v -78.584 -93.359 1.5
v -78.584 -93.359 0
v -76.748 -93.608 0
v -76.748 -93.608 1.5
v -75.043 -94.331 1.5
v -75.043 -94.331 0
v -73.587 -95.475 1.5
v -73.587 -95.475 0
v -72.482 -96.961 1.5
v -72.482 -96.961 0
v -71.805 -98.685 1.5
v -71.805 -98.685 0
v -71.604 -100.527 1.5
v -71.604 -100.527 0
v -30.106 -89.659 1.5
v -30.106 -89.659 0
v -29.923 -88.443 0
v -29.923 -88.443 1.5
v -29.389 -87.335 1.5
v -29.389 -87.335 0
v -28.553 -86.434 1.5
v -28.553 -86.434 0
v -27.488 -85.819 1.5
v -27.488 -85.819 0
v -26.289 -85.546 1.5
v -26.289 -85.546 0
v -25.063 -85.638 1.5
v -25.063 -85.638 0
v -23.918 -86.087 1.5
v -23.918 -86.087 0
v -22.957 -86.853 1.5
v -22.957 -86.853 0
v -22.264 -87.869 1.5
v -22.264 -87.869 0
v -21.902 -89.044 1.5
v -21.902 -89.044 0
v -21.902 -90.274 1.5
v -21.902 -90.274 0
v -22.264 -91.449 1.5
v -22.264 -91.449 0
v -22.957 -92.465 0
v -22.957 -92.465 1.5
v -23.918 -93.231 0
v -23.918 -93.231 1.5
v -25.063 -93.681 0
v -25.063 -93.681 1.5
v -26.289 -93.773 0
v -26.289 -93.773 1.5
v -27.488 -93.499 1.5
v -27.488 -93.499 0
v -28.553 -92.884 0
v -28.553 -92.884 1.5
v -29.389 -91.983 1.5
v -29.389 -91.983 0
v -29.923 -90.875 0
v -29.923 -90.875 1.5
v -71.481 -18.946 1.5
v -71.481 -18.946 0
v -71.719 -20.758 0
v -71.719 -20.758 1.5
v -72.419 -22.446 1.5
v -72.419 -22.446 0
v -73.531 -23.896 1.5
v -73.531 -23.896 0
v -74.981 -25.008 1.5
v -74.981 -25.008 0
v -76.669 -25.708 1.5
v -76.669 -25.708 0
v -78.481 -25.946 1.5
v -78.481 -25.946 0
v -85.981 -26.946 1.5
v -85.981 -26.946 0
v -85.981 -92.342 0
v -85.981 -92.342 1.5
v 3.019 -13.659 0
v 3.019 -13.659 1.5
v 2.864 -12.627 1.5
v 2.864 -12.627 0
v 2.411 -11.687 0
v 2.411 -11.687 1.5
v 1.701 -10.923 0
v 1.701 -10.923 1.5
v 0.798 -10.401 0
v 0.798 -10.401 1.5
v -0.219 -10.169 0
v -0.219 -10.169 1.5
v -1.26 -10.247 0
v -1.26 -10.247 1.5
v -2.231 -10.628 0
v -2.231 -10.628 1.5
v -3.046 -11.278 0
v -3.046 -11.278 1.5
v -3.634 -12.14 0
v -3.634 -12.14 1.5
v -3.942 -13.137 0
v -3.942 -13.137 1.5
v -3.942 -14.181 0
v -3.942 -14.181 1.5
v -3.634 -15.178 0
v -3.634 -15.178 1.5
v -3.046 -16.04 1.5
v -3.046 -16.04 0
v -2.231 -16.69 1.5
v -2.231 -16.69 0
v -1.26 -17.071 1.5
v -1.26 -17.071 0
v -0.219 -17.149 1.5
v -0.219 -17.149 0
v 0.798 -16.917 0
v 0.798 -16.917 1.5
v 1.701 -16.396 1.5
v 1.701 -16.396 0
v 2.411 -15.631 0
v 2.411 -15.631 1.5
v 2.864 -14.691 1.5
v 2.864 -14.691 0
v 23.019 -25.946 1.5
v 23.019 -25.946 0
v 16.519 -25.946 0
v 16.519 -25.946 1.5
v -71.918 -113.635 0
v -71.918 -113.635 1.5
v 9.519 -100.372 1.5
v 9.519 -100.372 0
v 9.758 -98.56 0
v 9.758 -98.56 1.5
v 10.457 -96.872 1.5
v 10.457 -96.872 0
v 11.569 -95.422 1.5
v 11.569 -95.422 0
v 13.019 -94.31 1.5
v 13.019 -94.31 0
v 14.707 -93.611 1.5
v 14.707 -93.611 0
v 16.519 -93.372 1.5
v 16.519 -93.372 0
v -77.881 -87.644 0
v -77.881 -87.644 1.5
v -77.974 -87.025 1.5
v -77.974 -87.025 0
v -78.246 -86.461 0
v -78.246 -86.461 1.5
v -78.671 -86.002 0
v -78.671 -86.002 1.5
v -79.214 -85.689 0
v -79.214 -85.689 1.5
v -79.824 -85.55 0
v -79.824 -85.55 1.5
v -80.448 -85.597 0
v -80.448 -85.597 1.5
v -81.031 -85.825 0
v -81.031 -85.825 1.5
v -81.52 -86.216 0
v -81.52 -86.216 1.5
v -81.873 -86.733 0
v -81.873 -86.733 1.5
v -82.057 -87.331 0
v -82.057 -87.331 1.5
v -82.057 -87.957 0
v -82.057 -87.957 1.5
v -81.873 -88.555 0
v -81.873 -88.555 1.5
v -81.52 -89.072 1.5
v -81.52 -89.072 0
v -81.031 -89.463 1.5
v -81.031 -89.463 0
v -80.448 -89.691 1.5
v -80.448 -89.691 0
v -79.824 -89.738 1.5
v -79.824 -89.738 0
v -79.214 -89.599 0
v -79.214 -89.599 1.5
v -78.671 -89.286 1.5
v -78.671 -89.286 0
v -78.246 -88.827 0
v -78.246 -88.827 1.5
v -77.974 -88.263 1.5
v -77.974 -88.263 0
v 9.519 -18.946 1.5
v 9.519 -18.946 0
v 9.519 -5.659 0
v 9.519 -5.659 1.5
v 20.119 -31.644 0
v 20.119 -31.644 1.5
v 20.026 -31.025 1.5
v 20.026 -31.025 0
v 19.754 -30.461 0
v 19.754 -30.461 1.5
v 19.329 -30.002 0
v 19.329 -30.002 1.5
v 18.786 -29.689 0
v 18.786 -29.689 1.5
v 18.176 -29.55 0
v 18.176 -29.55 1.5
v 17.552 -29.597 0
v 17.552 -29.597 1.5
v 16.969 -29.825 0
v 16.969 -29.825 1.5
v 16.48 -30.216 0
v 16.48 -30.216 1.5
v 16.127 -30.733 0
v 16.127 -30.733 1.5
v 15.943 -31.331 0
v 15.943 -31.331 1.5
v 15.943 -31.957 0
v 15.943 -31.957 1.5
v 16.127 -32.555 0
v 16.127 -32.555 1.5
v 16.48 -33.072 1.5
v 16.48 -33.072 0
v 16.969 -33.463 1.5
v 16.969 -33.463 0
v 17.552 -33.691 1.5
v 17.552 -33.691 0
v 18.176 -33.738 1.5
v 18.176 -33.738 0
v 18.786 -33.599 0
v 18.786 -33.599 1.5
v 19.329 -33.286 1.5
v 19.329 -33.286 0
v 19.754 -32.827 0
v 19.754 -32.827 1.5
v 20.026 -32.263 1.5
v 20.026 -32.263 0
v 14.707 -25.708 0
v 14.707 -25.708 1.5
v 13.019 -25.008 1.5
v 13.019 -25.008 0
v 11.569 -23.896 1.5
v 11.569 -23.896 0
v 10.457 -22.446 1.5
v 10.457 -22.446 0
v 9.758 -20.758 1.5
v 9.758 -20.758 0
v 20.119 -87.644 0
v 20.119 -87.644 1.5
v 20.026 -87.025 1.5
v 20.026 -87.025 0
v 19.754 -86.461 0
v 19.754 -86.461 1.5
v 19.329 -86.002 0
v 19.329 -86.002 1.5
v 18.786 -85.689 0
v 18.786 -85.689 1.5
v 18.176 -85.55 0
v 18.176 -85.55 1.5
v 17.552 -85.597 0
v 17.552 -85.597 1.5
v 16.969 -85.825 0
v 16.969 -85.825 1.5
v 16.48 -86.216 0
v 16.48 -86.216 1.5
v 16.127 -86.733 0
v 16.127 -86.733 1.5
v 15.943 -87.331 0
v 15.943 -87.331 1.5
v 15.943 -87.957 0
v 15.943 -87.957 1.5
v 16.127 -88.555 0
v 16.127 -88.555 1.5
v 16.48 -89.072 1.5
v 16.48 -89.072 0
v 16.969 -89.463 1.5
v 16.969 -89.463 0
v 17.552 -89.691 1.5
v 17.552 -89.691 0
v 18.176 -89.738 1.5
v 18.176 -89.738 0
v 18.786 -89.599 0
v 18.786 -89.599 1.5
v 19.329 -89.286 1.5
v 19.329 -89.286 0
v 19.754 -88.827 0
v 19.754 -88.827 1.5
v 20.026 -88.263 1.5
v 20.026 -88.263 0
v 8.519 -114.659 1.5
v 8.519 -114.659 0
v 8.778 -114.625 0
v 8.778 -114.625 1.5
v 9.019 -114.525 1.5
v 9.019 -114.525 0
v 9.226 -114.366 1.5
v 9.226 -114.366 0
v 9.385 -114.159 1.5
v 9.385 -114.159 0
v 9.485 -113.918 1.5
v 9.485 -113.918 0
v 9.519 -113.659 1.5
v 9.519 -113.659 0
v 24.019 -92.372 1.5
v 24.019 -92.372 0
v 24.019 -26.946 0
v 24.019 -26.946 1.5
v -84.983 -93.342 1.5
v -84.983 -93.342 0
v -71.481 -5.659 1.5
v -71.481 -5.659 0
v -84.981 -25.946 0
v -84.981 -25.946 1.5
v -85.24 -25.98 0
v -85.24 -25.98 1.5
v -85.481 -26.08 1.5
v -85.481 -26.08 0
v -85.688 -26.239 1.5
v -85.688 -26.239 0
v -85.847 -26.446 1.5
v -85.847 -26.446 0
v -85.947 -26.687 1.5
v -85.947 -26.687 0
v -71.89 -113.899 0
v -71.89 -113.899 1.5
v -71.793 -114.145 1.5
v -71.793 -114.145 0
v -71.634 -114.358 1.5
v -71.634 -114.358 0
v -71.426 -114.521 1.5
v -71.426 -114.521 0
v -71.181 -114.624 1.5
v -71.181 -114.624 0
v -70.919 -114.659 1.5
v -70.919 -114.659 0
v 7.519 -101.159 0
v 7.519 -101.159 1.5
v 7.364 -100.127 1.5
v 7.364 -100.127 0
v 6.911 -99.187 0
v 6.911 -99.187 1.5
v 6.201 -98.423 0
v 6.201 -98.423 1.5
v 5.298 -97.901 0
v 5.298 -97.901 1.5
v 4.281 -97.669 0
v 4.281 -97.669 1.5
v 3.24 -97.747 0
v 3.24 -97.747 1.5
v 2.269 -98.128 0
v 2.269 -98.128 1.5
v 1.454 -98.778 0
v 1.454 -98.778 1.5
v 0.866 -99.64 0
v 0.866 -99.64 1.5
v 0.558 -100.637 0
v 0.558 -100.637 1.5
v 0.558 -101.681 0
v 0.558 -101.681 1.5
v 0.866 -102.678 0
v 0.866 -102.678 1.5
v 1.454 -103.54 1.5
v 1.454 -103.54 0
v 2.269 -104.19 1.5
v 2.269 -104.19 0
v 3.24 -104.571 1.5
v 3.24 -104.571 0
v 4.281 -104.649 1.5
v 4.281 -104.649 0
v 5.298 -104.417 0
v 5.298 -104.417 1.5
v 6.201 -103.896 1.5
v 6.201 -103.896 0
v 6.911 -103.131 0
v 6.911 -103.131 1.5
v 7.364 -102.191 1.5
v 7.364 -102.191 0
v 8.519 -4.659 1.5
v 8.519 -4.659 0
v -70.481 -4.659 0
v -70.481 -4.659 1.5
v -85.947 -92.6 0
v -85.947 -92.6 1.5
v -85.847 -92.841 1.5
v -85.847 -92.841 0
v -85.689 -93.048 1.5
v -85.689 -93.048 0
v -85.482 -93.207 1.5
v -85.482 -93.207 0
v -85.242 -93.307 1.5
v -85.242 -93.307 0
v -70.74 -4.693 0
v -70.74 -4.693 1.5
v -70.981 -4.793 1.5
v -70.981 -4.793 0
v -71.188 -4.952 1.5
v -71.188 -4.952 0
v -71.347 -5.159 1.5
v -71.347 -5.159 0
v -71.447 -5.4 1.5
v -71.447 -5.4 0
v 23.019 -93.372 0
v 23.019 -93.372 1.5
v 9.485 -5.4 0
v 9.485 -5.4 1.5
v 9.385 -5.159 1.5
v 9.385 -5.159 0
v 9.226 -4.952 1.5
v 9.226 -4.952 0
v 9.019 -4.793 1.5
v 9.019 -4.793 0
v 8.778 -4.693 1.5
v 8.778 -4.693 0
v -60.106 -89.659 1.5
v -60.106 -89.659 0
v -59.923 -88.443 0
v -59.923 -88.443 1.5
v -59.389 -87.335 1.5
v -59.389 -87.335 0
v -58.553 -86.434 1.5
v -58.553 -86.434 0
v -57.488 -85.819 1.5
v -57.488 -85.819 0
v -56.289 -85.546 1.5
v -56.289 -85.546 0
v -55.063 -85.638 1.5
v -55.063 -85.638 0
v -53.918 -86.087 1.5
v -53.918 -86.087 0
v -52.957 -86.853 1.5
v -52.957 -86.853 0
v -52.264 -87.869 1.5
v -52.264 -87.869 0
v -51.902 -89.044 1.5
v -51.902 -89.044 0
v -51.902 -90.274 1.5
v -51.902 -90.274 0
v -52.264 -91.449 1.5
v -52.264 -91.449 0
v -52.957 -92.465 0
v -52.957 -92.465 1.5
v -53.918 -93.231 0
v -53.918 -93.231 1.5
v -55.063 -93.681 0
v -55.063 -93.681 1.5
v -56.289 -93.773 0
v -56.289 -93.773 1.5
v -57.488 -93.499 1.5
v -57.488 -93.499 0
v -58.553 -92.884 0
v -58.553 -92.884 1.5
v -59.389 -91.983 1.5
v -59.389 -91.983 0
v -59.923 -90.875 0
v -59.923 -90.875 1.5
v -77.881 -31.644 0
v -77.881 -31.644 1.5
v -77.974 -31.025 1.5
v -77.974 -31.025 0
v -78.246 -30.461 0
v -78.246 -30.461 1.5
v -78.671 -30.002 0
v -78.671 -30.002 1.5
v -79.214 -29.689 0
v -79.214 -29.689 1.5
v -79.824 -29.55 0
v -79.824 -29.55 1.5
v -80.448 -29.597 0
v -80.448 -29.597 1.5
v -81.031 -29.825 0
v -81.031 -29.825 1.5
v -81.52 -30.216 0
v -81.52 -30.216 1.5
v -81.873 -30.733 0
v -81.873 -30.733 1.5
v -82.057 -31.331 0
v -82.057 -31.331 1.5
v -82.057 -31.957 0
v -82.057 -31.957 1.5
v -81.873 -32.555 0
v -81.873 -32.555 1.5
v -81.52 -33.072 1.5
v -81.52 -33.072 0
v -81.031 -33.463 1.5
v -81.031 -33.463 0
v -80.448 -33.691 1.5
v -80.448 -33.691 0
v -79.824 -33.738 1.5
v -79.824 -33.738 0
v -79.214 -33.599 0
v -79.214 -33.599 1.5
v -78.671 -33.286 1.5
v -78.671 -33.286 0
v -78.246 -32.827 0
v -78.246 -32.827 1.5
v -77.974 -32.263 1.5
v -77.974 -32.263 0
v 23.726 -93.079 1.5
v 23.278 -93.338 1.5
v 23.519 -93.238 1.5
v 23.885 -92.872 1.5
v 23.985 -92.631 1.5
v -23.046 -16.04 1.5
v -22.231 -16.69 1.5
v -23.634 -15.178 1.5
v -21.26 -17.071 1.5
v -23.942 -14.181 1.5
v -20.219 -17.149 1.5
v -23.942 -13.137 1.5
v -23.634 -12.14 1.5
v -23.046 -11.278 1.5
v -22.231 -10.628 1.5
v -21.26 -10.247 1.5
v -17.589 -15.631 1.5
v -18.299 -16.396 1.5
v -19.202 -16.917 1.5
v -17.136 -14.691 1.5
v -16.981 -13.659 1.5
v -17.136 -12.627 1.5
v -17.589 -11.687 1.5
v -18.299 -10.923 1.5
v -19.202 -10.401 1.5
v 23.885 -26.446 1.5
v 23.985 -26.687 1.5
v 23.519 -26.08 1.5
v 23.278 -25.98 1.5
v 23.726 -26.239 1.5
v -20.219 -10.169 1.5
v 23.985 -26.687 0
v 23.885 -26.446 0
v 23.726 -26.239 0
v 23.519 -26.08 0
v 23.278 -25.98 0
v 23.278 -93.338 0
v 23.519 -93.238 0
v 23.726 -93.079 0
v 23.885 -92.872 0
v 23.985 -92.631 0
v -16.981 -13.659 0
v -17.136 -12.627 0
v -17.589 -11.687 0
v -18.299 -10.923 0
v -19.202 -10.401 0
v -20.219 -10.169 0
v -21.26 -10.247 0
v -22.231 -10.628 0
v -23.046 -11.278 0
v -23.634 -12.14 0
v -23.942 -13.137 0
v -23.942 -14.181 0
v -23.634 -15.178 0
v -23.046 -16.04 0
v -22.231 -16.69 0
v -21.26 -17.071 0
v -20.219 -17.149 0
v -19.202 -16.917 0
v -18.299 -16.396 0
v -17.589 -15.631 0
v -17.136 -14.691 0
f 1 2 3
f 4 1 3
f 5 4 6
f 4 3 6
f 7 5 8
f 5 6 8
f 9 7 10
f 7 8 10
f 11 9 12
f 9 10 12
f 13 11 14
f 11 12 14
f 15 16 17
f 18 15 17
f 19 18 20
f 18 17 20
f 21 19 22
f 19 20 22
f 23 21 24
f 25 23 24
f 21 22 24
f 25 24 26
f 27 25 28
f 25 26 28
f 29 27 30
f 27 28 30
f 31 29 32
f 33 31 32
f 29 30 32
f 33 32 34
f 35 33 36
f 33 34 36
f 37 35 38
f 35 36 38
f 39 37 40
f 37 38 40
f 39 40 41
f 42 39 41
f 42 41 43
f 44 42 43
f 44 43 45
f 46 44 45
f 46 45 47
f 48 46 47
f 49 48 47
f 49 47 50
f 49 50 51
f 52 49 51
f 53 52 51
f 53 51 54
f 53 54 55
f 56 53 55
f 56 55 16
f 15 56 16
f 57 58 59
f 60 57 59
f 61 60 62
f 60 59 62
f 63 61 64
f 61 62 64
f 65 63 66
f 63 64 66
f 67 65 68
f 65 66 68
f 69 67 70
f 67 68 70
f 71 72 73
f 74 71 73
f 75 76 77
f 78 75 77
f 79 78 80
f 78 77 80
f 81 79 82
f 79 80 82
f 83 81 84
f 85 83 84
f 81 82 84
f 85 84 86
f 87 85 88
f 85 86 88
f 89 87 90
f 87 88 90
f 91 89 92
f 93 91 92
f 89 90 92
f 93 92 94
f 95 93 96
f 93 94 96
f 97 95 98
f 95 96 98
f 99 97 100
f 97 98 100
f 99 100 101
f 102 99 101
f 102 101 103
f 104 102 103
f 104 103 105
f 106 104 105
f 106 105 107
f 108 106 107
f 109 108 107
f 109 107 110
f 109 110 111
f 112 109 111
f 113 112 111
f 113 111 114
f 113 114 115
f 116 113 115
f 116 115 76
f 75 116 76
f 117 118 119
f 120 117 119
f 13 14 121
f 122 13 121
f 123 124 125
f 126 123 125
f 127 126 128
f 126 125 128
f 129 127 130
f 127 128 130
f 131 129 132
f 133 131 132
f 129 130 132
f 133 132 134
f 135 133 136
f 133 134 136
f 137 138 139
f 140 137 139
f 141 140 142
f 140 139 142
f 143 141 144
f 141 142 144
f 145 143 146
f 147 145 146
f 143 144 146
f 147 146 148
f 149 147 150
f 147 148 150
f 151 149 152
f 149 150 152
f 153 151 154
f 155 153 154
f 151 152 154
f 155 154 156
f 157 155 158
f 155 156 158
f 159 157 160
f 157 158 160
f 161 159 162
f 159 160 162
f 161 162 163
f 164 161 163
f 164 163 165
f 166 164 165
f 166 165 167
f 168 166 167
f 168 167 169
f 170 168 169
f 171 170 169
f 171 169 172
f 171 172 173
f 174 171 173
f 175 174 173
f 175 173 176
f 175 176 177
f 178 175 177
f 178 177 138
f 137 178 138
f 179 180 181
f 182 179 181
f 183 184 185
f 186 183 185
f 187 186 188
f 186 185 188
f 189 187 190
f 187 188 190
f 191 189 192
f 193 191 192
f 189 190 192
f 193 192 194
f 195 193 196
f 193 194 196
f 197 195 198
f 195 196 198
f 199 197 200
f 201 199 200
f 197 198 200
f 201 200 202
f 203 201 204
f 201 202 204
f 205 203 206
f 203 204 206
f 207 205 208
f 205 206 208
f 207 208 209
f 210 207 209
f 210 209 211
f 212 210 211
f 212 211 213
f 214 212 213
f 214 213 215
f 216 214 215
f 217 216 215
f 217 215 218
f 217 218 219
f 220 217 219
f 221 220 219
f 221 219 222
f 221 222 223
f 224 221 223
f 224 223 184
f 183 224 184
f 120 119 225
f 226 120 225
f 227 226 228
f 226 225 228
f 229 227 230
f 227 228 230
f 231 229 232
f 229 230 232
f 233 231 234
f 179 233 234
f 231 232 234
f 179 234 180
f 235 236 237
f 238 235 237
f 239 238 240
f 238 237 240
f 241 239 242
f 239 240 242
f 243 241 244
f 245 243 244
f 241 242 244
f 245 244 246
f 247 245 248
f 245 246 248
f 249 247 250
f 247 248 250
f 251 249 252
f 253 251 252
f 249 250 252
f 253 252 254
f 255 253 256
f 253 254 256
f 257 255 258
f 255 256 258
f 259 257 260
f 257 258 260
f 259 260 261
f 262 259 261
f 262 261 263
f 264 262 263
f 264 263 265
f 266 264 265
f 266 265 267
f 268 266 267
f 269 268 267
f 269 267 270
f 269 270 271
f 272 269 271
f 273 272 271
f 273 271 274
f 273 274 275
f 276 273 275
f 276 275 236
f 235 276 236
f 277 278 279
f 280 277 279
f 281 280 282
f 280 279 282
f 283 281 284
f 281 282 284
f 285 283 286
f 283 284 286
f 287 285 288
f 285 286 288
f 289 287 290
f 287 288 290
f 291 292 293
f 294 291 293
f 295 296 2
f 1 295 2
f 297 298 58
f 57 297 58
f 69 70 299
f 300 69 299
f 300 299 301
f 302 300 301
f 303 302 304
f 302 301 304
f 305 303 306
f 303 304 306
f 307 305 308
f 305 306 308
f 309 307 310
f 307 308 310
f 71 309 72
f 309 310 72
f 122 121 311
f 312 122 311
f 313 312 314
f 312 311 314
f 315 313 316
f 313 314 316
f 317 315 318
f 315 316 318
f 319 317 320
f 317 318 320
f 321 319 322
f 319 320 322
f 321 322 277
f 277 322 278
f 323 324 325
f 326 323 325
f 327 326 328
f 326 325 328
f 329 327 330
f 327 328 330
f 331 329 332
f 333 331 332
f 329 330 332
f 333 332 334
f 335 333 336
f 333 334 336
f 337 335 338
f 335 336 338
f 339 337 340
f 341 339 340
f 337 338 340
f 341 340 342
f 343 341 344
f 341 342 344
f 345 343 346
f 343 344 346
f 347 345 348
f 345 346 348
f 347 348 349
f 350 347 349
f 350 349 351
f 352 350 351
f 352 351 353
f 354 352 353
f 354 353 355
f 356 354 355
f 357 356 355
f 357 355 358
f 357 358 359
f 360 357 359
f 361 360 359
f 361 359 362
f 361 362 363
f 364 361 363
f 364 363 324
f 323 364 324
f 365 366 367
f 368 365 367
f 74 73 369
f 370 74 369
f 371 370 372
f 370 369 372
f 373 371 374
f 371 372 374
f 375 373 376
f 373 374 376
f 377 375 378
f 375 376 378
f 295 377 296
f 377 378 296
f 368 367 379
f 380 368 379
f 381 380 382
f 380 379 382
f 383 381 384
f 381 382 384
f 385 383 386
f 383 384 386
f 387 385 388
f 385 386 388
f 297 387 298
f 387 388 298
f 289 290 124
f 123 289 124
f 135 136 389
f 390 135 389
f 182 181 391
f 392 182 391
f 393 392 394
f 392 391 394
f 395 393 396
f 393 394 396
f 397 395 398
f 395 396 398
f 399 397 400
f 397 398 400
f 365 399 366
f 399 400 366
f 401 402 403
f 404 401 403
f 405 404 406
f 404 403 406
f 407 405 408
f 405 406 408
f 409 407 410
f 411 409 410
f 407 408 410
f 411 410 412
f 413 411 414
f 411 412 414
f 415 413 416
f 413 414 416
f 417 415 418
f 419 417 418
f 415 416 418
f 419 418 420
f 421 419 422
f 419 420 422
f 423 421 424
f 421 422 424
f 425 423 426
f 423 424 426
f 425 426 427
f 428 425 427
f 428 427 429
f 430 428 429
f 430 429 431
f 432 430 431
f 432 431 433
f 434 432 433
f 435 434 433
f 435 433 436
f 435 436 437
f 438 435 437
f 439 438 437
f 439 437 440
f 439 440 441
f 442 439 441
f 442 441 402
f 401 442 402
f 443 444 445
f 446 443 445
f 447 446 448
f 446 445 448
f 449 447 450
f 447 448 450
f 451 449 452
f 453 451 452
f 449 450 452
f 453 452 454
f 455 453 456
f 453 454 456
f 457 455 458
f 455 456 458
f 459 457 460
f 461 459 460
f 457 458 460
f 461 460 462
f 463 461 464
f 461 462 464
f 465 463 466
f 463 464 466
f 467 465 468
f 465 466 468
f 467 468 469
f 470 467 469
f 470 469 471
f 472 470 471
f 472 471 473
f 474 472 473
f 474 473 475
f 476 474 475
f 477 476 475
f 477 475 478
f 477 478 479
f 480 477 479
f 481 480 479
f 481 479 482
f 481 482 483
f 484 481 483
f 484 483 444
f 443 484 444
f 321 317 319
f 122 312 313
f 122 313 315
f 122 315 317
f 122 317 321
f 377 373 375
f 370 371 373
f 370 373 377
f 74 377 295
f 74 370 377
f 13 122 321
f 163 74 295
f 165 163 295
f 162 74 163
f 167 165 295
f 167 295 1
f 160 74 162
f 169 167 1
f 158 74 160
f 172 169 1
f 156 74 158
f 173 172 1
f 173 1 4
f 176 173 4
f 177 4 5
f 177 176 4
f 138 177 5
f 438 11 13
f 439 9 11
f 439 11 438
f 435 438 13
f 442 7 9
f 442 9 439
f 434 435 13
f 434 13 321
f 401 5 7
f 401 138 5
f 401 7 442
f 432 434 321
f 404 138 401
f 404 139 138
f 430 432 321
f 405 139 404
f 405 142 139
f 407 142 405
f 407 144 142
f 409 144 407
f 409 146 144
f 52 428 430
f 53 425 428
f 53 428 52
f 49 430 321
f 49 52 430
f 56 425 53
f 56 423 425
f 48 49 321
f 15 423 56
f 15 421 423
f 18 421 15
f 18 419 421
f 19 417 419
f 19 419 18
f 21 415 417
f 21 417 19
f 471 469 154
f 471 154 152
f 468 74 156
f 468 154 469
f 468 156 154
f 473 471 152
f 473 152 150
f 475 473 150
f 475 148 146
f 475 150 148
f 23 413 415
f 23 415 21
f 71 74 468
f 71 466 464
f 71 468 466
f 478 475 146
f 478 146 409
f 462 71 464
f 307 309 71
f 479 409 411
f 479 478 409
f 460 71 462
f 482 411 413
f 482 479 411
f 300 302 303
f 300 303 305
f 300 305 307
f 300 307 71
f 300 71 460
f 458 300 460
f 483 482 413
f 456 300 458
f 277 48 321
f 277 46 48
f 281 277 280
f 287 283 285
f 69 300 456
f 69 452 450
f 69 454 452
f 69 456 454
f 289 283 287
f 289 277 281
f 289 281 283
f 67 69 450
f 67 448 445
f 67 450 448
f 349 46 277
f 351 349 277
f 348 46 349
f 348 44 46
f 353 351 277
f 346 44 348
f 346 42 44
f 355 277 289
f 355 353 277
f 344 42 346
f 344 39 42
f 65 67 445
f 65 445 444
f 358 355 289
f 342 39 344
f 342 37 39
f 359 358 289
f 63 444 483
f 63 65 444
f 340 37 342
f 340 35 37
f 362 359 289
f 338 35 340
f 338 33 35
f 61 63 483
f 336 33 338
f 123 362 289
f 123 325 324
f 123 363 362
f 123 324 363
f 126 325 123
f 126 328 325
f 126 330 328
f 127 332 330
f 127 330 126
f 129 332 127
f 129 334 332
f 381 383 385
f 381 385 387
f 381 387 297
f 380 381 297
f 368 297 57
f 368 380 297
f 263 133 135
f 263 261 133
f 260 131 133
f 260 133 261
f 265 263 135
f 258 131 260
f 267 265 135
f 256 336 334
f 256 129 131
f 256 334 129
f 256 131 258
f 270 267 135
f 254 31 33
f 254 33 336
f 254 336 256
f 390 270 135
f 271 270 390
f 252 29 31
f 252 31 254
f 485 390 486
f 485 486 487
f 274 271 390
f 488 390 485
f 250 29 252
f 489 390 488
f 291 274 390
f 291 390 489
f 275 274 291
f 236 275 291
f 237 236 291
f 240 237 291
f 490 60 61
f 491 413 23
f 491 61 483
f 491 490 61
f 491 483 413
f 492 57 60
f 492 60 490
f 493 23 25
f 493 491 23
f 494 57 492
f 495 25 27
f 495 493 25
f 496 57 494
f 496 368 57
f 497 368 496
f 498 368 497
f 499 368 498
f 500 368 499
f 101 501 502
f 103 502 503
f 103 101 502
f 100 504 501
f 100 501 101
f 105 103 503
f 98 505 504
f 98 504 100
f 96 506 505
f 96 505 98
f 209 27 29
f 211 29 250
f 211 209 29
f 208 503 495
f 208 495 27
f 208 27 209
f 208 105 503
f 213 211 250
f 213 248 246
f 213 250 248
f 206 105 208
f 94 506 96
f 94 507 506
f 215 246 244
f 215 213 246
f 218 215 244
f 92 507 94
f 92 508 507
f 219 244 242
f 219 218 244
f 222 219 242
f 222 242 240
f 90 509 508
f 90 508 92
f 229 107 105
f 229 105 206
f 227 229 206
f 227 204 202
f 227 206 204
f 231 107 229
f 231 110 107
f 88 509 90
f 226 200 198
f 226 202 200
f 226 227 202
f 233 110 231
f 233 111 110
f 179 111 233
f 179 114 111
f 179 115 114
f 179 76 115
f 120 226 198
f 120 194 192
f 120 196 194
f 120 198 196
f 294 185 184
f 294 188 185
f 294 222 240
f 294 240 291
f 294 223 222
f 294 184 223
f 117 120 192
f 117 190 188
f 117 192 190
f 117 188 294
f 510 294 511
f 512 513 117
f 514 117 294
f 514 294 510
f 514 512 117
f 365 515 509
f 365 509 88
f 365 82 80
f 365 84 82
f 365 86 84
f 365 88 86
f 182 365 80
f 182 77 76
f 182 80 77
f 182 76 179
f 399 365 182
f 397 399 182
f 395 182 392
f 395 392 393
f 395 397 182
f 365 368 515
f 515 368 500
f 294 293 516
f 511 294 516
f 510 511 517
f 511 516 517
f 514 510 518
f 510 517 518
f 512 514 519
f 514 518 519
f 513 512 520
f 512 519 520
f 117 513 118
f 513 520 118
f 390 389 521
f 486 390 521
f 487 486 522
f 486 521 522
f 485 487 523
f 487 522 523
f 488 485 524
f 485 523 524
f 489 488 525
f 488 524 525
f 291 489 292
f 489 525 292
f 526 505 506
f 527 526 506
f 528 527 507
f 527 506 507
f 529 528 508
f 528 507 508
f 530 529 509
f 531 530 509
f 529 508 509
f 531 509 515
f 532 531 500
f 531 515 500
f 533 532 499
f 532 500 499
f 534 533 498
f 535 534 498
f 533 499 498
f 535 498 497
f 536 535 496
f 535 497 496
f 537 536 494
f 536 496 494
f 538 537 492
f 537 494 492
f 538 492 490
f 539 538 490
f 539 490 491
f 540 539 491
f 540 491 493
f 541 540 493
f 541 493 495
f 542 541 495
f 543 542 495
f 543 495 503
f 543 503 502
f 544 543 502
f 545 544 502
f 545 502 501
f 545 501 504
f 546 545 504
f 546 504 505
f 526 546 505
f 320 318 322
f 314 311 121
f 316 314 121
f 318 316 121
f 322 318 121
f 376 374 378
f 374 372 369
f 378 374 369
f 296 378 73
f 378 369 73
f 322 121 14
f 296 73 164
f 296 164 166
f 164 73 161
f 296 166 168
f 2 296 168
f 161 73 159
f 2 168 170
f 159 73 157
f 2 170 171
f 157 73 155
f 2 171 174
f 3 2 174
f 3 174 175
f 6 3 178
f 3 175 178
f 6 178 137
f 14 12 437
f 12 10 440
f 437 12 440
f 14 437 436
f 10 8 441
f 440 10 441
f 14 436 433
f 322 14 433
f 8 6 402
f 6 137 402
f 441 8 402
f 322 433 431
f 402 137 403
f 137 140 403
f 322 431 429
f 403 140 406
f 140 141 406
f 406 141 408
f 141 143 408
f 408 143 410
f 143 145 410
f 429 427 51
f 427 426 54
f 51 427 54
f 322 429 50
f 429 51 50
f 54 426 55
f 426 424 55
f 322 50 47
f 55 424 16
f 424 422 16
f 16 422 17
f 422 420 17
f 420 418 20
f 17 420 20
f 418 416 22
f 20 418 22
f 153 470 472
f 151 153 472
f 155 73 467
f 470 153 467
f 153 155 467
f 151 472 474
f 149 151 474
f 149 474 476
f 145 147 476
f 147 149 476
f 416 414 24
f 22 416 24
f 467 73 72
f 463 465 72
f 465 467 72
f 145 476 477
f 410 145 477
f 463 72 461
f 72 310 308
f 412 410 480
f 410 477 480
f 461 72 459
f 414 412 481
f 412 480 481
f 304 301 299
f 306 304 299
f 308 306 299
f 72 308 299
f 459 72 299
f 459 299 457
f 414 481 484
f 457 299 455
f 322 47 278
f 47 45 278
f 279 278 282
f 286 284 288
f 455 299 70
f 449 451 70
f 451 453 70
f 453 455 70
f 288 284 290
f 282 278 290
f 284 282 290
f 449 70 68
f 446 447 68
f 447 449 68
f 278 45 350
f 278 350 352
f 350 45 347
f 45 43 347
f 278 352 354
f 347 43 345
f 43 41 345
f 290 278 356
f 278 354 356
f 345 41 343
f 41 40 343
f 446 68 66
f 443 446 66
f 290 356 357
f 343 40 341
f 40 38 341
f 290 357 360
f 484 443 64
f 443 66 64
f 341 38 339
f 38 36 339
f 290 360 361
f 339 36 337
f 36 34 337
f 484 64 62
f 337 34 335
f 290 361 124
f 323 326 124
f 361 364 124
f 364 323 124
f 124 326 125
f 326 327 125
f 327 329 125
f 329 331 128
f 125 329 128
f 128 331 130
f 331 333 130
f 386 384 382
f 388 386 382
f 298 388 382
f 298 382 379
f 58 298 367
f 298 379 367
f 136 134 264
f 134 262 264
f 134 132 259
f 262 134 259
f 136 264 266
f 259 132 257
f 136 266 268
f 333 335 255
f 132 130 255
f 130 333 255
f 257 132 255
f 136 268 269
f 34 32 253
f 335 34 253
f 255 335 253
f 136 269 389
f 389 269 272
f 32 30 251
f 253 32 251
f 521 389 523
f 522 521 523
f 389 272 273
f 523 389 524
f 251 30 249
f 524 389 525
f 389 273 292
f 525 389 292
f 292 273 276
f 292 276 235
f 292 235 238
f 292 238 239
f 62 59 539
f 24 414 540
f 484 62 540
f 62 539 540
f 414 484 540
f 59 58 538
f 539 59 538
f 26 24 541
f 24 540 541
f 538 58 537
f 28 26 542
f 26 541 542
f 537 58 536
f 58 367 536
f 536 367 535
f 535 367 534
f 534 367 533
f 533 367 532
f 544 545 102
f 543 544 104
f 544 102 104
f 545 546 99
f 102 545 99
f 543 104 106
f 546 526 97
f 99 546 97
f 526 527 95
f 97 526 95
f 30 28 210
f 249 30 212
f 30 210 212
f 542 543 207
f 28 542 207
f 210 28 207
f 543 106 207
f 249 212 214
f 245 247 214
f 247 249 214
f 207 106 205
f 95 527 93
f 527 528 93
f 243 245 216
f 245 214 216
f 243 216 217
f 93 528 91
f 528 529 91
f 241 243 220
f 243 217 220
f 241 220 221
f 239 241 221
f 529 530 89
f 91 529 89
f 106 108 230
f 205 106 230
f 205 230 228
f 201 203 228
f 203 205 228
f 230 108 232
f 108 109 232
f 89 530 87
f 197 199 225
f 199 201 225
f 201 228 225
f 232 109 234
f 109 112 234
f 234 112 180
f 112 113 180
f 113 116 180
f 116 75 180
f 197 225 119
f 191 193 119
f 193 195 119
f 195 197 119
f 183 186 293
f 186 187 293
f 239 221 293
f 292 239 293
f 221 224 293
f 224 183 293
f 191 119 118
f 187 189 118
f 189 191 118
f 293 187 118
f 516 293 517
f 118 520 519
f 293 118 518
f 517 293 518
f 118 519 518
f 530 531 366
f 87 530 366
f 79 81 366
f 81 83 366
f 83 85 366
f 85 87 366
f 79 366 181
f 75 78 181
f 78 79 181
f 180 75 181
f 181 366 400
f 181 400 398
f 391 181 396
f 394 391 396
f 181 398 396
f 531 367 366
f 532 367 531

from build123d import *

# Parameters (mm, degrees)
EXTRUDE_1_DEPTH     = 1.5
HOLE_WIZARD_M4_1_D  = 4.2
HOLE_WIZARD_M8_1_D  = 8.25
SKETCH_8_R          = 3.5
CUT_EXTRUDE_1_DEPTH = 144.323608762
SKETCH_9_R          = 3.5
CUT_EXTRUDE_2_DEPTH = 144.323608762


with BuildPart() as part:
    # 草圖1 → 填料-伸長1 (new body)
    with BuildSketch(Plane.XY):
        with BuildLine():
            Line((9.519190028, -18.946187519), (9.519190028, -5.659090909))
            ThreePointArc((9.519190028, -5.659090909), (9.226296809, -4.951984128), (8.519190028, -4.659090909))
            Line((8.519190028, -4.659090909), (-70.48081017, -4.659090909))
            ThreePointArc((-70.48081017, -4.659090909), (-71.187916951, -4.951984128), (-71.48081017, -5.659090909))
            Line((-71.48081017, -5.659090909), (-71.48081017, -18.946187519))
            ThreePointArc((-71.48081017, -18.946187519), (-73.531062702, -23.895934988), (-78.48081017, -25.946187519))
            Line((-78.48081017, -25.946187519), (-84.980810071, -25.946187519))
            ThreePointArc((-84.980810071, -25.946187519), (-85.687916853, -26.239080738), (-85.980810071, -26.946187519))
            Line((-85.980810071, -26.946187519), (-85.980810071, -92.341911374))
            ThreePointArc((-85.980810071, -92.341911374), (-85.688840793, -93.048093006), (-84.983425077, -93.341907955))
            Line((-84.983425077, -93.341907955), (-78.583599692, -93.358643592))
            ThreePointArc((-78.583599692, -93.358643592), (-73.586751521, -95.475153852), (-71.603919064, -100.526538095))
            Line((-71.603919064, -100.526538095), (-71.918462387, -113.635102561))
            ThreePointArc((-71.918462387, -113.635102561), (-71.634287831, -114.357665047), (-70.918750149, -114.659090909))
            Line((-70.918750149, -114.659090909), (8.519190028, -114.659090909))
            ThreePointArc((8.519190028, -114.659090909), (9.226296809, -114.36619769), (9.519190028, -113.659090909))
            Line((9.519190028, -113.659090909), (9.519190028, -100.371994299))
            ThreePointArc((9.519190028, -100.371994299), (11.569442559, -95.422246831), (16.519190028, -93.371994299))
            Line((16.519190028, -93.371994299), (23.019189929, -93.371994299))
            ThreePointArc((23.019189929, -93.371994299), (23.72629671, -93.07910108), (24.019189929, -92.371994299))
            Line((24.019189929, -92.371994299), (24.019189929, -26.946187519))
            ThreePointArc((24.019189929, -26.946187519), (23.72629671, -26.239080738), (23.019189929, -25.946187519))
            Line((23.019189929, -25.946187519), (16.519190028, -25.946187519))
            ThreePointArc((16.519190028, -25.946187519), (11.569442559, -23.895934988), (9.519190028, -18.946187519))
        make_face()
    extrude(amount=EXTRUDE_1_DEPTH)

    # M4 螺旋的螺孔鑽1 (through all)
    with Locations(Plane(origin=(0, 0, 0), x_dir=(-1, 0, 0), z_dir=(0, 0, -1))):
        with Locations((79.980810071, -87.644049447), (-18.019189929, -87.644049447), (-18.019189929, -31.644049447), (79.980810071, -31.644049447)):
            Hole(HOLE_WIZARD_M4_1_D / 2)

    # M8 螺旋的螺孔鑽1 (through all)
    with Locations(Plane.XY.offset(1.5)):
        with Locations((-55.980810071, -89.659090909), (-25.980810071, -89.659090909)):
            Hole(HOLE_WIZARD_M8_1_D / 2)

    # 草圖8 → 除料-伸長1 (cut, through all)
    with BuildSketch(Plane.XY.offset(1.5)):
        with Locations((4.019190028, -101.159090909)):
            Circle(SKETCH_8_R)
    extrude(amount=-CUT_EXTRUDE_1_DEPTH, mode=Mode.SUBTRACT)

    # 草圖9 → 除料-伸長2 (cut, through all)
    with BuildSketch(Plane.XY.offset(1.5)):
        with Locations((-0.480809972, -13.659090909)):
            Circle(SKETCH_9_R)
        with Locations((-20.480809972, -13.659090909)):
            Circle(SKETCH_9_R)
    extrude(amount=-CUT_EXTRUDE_2_DEPTH, mode=Mode.SUBTRACT)


solid = part.part
